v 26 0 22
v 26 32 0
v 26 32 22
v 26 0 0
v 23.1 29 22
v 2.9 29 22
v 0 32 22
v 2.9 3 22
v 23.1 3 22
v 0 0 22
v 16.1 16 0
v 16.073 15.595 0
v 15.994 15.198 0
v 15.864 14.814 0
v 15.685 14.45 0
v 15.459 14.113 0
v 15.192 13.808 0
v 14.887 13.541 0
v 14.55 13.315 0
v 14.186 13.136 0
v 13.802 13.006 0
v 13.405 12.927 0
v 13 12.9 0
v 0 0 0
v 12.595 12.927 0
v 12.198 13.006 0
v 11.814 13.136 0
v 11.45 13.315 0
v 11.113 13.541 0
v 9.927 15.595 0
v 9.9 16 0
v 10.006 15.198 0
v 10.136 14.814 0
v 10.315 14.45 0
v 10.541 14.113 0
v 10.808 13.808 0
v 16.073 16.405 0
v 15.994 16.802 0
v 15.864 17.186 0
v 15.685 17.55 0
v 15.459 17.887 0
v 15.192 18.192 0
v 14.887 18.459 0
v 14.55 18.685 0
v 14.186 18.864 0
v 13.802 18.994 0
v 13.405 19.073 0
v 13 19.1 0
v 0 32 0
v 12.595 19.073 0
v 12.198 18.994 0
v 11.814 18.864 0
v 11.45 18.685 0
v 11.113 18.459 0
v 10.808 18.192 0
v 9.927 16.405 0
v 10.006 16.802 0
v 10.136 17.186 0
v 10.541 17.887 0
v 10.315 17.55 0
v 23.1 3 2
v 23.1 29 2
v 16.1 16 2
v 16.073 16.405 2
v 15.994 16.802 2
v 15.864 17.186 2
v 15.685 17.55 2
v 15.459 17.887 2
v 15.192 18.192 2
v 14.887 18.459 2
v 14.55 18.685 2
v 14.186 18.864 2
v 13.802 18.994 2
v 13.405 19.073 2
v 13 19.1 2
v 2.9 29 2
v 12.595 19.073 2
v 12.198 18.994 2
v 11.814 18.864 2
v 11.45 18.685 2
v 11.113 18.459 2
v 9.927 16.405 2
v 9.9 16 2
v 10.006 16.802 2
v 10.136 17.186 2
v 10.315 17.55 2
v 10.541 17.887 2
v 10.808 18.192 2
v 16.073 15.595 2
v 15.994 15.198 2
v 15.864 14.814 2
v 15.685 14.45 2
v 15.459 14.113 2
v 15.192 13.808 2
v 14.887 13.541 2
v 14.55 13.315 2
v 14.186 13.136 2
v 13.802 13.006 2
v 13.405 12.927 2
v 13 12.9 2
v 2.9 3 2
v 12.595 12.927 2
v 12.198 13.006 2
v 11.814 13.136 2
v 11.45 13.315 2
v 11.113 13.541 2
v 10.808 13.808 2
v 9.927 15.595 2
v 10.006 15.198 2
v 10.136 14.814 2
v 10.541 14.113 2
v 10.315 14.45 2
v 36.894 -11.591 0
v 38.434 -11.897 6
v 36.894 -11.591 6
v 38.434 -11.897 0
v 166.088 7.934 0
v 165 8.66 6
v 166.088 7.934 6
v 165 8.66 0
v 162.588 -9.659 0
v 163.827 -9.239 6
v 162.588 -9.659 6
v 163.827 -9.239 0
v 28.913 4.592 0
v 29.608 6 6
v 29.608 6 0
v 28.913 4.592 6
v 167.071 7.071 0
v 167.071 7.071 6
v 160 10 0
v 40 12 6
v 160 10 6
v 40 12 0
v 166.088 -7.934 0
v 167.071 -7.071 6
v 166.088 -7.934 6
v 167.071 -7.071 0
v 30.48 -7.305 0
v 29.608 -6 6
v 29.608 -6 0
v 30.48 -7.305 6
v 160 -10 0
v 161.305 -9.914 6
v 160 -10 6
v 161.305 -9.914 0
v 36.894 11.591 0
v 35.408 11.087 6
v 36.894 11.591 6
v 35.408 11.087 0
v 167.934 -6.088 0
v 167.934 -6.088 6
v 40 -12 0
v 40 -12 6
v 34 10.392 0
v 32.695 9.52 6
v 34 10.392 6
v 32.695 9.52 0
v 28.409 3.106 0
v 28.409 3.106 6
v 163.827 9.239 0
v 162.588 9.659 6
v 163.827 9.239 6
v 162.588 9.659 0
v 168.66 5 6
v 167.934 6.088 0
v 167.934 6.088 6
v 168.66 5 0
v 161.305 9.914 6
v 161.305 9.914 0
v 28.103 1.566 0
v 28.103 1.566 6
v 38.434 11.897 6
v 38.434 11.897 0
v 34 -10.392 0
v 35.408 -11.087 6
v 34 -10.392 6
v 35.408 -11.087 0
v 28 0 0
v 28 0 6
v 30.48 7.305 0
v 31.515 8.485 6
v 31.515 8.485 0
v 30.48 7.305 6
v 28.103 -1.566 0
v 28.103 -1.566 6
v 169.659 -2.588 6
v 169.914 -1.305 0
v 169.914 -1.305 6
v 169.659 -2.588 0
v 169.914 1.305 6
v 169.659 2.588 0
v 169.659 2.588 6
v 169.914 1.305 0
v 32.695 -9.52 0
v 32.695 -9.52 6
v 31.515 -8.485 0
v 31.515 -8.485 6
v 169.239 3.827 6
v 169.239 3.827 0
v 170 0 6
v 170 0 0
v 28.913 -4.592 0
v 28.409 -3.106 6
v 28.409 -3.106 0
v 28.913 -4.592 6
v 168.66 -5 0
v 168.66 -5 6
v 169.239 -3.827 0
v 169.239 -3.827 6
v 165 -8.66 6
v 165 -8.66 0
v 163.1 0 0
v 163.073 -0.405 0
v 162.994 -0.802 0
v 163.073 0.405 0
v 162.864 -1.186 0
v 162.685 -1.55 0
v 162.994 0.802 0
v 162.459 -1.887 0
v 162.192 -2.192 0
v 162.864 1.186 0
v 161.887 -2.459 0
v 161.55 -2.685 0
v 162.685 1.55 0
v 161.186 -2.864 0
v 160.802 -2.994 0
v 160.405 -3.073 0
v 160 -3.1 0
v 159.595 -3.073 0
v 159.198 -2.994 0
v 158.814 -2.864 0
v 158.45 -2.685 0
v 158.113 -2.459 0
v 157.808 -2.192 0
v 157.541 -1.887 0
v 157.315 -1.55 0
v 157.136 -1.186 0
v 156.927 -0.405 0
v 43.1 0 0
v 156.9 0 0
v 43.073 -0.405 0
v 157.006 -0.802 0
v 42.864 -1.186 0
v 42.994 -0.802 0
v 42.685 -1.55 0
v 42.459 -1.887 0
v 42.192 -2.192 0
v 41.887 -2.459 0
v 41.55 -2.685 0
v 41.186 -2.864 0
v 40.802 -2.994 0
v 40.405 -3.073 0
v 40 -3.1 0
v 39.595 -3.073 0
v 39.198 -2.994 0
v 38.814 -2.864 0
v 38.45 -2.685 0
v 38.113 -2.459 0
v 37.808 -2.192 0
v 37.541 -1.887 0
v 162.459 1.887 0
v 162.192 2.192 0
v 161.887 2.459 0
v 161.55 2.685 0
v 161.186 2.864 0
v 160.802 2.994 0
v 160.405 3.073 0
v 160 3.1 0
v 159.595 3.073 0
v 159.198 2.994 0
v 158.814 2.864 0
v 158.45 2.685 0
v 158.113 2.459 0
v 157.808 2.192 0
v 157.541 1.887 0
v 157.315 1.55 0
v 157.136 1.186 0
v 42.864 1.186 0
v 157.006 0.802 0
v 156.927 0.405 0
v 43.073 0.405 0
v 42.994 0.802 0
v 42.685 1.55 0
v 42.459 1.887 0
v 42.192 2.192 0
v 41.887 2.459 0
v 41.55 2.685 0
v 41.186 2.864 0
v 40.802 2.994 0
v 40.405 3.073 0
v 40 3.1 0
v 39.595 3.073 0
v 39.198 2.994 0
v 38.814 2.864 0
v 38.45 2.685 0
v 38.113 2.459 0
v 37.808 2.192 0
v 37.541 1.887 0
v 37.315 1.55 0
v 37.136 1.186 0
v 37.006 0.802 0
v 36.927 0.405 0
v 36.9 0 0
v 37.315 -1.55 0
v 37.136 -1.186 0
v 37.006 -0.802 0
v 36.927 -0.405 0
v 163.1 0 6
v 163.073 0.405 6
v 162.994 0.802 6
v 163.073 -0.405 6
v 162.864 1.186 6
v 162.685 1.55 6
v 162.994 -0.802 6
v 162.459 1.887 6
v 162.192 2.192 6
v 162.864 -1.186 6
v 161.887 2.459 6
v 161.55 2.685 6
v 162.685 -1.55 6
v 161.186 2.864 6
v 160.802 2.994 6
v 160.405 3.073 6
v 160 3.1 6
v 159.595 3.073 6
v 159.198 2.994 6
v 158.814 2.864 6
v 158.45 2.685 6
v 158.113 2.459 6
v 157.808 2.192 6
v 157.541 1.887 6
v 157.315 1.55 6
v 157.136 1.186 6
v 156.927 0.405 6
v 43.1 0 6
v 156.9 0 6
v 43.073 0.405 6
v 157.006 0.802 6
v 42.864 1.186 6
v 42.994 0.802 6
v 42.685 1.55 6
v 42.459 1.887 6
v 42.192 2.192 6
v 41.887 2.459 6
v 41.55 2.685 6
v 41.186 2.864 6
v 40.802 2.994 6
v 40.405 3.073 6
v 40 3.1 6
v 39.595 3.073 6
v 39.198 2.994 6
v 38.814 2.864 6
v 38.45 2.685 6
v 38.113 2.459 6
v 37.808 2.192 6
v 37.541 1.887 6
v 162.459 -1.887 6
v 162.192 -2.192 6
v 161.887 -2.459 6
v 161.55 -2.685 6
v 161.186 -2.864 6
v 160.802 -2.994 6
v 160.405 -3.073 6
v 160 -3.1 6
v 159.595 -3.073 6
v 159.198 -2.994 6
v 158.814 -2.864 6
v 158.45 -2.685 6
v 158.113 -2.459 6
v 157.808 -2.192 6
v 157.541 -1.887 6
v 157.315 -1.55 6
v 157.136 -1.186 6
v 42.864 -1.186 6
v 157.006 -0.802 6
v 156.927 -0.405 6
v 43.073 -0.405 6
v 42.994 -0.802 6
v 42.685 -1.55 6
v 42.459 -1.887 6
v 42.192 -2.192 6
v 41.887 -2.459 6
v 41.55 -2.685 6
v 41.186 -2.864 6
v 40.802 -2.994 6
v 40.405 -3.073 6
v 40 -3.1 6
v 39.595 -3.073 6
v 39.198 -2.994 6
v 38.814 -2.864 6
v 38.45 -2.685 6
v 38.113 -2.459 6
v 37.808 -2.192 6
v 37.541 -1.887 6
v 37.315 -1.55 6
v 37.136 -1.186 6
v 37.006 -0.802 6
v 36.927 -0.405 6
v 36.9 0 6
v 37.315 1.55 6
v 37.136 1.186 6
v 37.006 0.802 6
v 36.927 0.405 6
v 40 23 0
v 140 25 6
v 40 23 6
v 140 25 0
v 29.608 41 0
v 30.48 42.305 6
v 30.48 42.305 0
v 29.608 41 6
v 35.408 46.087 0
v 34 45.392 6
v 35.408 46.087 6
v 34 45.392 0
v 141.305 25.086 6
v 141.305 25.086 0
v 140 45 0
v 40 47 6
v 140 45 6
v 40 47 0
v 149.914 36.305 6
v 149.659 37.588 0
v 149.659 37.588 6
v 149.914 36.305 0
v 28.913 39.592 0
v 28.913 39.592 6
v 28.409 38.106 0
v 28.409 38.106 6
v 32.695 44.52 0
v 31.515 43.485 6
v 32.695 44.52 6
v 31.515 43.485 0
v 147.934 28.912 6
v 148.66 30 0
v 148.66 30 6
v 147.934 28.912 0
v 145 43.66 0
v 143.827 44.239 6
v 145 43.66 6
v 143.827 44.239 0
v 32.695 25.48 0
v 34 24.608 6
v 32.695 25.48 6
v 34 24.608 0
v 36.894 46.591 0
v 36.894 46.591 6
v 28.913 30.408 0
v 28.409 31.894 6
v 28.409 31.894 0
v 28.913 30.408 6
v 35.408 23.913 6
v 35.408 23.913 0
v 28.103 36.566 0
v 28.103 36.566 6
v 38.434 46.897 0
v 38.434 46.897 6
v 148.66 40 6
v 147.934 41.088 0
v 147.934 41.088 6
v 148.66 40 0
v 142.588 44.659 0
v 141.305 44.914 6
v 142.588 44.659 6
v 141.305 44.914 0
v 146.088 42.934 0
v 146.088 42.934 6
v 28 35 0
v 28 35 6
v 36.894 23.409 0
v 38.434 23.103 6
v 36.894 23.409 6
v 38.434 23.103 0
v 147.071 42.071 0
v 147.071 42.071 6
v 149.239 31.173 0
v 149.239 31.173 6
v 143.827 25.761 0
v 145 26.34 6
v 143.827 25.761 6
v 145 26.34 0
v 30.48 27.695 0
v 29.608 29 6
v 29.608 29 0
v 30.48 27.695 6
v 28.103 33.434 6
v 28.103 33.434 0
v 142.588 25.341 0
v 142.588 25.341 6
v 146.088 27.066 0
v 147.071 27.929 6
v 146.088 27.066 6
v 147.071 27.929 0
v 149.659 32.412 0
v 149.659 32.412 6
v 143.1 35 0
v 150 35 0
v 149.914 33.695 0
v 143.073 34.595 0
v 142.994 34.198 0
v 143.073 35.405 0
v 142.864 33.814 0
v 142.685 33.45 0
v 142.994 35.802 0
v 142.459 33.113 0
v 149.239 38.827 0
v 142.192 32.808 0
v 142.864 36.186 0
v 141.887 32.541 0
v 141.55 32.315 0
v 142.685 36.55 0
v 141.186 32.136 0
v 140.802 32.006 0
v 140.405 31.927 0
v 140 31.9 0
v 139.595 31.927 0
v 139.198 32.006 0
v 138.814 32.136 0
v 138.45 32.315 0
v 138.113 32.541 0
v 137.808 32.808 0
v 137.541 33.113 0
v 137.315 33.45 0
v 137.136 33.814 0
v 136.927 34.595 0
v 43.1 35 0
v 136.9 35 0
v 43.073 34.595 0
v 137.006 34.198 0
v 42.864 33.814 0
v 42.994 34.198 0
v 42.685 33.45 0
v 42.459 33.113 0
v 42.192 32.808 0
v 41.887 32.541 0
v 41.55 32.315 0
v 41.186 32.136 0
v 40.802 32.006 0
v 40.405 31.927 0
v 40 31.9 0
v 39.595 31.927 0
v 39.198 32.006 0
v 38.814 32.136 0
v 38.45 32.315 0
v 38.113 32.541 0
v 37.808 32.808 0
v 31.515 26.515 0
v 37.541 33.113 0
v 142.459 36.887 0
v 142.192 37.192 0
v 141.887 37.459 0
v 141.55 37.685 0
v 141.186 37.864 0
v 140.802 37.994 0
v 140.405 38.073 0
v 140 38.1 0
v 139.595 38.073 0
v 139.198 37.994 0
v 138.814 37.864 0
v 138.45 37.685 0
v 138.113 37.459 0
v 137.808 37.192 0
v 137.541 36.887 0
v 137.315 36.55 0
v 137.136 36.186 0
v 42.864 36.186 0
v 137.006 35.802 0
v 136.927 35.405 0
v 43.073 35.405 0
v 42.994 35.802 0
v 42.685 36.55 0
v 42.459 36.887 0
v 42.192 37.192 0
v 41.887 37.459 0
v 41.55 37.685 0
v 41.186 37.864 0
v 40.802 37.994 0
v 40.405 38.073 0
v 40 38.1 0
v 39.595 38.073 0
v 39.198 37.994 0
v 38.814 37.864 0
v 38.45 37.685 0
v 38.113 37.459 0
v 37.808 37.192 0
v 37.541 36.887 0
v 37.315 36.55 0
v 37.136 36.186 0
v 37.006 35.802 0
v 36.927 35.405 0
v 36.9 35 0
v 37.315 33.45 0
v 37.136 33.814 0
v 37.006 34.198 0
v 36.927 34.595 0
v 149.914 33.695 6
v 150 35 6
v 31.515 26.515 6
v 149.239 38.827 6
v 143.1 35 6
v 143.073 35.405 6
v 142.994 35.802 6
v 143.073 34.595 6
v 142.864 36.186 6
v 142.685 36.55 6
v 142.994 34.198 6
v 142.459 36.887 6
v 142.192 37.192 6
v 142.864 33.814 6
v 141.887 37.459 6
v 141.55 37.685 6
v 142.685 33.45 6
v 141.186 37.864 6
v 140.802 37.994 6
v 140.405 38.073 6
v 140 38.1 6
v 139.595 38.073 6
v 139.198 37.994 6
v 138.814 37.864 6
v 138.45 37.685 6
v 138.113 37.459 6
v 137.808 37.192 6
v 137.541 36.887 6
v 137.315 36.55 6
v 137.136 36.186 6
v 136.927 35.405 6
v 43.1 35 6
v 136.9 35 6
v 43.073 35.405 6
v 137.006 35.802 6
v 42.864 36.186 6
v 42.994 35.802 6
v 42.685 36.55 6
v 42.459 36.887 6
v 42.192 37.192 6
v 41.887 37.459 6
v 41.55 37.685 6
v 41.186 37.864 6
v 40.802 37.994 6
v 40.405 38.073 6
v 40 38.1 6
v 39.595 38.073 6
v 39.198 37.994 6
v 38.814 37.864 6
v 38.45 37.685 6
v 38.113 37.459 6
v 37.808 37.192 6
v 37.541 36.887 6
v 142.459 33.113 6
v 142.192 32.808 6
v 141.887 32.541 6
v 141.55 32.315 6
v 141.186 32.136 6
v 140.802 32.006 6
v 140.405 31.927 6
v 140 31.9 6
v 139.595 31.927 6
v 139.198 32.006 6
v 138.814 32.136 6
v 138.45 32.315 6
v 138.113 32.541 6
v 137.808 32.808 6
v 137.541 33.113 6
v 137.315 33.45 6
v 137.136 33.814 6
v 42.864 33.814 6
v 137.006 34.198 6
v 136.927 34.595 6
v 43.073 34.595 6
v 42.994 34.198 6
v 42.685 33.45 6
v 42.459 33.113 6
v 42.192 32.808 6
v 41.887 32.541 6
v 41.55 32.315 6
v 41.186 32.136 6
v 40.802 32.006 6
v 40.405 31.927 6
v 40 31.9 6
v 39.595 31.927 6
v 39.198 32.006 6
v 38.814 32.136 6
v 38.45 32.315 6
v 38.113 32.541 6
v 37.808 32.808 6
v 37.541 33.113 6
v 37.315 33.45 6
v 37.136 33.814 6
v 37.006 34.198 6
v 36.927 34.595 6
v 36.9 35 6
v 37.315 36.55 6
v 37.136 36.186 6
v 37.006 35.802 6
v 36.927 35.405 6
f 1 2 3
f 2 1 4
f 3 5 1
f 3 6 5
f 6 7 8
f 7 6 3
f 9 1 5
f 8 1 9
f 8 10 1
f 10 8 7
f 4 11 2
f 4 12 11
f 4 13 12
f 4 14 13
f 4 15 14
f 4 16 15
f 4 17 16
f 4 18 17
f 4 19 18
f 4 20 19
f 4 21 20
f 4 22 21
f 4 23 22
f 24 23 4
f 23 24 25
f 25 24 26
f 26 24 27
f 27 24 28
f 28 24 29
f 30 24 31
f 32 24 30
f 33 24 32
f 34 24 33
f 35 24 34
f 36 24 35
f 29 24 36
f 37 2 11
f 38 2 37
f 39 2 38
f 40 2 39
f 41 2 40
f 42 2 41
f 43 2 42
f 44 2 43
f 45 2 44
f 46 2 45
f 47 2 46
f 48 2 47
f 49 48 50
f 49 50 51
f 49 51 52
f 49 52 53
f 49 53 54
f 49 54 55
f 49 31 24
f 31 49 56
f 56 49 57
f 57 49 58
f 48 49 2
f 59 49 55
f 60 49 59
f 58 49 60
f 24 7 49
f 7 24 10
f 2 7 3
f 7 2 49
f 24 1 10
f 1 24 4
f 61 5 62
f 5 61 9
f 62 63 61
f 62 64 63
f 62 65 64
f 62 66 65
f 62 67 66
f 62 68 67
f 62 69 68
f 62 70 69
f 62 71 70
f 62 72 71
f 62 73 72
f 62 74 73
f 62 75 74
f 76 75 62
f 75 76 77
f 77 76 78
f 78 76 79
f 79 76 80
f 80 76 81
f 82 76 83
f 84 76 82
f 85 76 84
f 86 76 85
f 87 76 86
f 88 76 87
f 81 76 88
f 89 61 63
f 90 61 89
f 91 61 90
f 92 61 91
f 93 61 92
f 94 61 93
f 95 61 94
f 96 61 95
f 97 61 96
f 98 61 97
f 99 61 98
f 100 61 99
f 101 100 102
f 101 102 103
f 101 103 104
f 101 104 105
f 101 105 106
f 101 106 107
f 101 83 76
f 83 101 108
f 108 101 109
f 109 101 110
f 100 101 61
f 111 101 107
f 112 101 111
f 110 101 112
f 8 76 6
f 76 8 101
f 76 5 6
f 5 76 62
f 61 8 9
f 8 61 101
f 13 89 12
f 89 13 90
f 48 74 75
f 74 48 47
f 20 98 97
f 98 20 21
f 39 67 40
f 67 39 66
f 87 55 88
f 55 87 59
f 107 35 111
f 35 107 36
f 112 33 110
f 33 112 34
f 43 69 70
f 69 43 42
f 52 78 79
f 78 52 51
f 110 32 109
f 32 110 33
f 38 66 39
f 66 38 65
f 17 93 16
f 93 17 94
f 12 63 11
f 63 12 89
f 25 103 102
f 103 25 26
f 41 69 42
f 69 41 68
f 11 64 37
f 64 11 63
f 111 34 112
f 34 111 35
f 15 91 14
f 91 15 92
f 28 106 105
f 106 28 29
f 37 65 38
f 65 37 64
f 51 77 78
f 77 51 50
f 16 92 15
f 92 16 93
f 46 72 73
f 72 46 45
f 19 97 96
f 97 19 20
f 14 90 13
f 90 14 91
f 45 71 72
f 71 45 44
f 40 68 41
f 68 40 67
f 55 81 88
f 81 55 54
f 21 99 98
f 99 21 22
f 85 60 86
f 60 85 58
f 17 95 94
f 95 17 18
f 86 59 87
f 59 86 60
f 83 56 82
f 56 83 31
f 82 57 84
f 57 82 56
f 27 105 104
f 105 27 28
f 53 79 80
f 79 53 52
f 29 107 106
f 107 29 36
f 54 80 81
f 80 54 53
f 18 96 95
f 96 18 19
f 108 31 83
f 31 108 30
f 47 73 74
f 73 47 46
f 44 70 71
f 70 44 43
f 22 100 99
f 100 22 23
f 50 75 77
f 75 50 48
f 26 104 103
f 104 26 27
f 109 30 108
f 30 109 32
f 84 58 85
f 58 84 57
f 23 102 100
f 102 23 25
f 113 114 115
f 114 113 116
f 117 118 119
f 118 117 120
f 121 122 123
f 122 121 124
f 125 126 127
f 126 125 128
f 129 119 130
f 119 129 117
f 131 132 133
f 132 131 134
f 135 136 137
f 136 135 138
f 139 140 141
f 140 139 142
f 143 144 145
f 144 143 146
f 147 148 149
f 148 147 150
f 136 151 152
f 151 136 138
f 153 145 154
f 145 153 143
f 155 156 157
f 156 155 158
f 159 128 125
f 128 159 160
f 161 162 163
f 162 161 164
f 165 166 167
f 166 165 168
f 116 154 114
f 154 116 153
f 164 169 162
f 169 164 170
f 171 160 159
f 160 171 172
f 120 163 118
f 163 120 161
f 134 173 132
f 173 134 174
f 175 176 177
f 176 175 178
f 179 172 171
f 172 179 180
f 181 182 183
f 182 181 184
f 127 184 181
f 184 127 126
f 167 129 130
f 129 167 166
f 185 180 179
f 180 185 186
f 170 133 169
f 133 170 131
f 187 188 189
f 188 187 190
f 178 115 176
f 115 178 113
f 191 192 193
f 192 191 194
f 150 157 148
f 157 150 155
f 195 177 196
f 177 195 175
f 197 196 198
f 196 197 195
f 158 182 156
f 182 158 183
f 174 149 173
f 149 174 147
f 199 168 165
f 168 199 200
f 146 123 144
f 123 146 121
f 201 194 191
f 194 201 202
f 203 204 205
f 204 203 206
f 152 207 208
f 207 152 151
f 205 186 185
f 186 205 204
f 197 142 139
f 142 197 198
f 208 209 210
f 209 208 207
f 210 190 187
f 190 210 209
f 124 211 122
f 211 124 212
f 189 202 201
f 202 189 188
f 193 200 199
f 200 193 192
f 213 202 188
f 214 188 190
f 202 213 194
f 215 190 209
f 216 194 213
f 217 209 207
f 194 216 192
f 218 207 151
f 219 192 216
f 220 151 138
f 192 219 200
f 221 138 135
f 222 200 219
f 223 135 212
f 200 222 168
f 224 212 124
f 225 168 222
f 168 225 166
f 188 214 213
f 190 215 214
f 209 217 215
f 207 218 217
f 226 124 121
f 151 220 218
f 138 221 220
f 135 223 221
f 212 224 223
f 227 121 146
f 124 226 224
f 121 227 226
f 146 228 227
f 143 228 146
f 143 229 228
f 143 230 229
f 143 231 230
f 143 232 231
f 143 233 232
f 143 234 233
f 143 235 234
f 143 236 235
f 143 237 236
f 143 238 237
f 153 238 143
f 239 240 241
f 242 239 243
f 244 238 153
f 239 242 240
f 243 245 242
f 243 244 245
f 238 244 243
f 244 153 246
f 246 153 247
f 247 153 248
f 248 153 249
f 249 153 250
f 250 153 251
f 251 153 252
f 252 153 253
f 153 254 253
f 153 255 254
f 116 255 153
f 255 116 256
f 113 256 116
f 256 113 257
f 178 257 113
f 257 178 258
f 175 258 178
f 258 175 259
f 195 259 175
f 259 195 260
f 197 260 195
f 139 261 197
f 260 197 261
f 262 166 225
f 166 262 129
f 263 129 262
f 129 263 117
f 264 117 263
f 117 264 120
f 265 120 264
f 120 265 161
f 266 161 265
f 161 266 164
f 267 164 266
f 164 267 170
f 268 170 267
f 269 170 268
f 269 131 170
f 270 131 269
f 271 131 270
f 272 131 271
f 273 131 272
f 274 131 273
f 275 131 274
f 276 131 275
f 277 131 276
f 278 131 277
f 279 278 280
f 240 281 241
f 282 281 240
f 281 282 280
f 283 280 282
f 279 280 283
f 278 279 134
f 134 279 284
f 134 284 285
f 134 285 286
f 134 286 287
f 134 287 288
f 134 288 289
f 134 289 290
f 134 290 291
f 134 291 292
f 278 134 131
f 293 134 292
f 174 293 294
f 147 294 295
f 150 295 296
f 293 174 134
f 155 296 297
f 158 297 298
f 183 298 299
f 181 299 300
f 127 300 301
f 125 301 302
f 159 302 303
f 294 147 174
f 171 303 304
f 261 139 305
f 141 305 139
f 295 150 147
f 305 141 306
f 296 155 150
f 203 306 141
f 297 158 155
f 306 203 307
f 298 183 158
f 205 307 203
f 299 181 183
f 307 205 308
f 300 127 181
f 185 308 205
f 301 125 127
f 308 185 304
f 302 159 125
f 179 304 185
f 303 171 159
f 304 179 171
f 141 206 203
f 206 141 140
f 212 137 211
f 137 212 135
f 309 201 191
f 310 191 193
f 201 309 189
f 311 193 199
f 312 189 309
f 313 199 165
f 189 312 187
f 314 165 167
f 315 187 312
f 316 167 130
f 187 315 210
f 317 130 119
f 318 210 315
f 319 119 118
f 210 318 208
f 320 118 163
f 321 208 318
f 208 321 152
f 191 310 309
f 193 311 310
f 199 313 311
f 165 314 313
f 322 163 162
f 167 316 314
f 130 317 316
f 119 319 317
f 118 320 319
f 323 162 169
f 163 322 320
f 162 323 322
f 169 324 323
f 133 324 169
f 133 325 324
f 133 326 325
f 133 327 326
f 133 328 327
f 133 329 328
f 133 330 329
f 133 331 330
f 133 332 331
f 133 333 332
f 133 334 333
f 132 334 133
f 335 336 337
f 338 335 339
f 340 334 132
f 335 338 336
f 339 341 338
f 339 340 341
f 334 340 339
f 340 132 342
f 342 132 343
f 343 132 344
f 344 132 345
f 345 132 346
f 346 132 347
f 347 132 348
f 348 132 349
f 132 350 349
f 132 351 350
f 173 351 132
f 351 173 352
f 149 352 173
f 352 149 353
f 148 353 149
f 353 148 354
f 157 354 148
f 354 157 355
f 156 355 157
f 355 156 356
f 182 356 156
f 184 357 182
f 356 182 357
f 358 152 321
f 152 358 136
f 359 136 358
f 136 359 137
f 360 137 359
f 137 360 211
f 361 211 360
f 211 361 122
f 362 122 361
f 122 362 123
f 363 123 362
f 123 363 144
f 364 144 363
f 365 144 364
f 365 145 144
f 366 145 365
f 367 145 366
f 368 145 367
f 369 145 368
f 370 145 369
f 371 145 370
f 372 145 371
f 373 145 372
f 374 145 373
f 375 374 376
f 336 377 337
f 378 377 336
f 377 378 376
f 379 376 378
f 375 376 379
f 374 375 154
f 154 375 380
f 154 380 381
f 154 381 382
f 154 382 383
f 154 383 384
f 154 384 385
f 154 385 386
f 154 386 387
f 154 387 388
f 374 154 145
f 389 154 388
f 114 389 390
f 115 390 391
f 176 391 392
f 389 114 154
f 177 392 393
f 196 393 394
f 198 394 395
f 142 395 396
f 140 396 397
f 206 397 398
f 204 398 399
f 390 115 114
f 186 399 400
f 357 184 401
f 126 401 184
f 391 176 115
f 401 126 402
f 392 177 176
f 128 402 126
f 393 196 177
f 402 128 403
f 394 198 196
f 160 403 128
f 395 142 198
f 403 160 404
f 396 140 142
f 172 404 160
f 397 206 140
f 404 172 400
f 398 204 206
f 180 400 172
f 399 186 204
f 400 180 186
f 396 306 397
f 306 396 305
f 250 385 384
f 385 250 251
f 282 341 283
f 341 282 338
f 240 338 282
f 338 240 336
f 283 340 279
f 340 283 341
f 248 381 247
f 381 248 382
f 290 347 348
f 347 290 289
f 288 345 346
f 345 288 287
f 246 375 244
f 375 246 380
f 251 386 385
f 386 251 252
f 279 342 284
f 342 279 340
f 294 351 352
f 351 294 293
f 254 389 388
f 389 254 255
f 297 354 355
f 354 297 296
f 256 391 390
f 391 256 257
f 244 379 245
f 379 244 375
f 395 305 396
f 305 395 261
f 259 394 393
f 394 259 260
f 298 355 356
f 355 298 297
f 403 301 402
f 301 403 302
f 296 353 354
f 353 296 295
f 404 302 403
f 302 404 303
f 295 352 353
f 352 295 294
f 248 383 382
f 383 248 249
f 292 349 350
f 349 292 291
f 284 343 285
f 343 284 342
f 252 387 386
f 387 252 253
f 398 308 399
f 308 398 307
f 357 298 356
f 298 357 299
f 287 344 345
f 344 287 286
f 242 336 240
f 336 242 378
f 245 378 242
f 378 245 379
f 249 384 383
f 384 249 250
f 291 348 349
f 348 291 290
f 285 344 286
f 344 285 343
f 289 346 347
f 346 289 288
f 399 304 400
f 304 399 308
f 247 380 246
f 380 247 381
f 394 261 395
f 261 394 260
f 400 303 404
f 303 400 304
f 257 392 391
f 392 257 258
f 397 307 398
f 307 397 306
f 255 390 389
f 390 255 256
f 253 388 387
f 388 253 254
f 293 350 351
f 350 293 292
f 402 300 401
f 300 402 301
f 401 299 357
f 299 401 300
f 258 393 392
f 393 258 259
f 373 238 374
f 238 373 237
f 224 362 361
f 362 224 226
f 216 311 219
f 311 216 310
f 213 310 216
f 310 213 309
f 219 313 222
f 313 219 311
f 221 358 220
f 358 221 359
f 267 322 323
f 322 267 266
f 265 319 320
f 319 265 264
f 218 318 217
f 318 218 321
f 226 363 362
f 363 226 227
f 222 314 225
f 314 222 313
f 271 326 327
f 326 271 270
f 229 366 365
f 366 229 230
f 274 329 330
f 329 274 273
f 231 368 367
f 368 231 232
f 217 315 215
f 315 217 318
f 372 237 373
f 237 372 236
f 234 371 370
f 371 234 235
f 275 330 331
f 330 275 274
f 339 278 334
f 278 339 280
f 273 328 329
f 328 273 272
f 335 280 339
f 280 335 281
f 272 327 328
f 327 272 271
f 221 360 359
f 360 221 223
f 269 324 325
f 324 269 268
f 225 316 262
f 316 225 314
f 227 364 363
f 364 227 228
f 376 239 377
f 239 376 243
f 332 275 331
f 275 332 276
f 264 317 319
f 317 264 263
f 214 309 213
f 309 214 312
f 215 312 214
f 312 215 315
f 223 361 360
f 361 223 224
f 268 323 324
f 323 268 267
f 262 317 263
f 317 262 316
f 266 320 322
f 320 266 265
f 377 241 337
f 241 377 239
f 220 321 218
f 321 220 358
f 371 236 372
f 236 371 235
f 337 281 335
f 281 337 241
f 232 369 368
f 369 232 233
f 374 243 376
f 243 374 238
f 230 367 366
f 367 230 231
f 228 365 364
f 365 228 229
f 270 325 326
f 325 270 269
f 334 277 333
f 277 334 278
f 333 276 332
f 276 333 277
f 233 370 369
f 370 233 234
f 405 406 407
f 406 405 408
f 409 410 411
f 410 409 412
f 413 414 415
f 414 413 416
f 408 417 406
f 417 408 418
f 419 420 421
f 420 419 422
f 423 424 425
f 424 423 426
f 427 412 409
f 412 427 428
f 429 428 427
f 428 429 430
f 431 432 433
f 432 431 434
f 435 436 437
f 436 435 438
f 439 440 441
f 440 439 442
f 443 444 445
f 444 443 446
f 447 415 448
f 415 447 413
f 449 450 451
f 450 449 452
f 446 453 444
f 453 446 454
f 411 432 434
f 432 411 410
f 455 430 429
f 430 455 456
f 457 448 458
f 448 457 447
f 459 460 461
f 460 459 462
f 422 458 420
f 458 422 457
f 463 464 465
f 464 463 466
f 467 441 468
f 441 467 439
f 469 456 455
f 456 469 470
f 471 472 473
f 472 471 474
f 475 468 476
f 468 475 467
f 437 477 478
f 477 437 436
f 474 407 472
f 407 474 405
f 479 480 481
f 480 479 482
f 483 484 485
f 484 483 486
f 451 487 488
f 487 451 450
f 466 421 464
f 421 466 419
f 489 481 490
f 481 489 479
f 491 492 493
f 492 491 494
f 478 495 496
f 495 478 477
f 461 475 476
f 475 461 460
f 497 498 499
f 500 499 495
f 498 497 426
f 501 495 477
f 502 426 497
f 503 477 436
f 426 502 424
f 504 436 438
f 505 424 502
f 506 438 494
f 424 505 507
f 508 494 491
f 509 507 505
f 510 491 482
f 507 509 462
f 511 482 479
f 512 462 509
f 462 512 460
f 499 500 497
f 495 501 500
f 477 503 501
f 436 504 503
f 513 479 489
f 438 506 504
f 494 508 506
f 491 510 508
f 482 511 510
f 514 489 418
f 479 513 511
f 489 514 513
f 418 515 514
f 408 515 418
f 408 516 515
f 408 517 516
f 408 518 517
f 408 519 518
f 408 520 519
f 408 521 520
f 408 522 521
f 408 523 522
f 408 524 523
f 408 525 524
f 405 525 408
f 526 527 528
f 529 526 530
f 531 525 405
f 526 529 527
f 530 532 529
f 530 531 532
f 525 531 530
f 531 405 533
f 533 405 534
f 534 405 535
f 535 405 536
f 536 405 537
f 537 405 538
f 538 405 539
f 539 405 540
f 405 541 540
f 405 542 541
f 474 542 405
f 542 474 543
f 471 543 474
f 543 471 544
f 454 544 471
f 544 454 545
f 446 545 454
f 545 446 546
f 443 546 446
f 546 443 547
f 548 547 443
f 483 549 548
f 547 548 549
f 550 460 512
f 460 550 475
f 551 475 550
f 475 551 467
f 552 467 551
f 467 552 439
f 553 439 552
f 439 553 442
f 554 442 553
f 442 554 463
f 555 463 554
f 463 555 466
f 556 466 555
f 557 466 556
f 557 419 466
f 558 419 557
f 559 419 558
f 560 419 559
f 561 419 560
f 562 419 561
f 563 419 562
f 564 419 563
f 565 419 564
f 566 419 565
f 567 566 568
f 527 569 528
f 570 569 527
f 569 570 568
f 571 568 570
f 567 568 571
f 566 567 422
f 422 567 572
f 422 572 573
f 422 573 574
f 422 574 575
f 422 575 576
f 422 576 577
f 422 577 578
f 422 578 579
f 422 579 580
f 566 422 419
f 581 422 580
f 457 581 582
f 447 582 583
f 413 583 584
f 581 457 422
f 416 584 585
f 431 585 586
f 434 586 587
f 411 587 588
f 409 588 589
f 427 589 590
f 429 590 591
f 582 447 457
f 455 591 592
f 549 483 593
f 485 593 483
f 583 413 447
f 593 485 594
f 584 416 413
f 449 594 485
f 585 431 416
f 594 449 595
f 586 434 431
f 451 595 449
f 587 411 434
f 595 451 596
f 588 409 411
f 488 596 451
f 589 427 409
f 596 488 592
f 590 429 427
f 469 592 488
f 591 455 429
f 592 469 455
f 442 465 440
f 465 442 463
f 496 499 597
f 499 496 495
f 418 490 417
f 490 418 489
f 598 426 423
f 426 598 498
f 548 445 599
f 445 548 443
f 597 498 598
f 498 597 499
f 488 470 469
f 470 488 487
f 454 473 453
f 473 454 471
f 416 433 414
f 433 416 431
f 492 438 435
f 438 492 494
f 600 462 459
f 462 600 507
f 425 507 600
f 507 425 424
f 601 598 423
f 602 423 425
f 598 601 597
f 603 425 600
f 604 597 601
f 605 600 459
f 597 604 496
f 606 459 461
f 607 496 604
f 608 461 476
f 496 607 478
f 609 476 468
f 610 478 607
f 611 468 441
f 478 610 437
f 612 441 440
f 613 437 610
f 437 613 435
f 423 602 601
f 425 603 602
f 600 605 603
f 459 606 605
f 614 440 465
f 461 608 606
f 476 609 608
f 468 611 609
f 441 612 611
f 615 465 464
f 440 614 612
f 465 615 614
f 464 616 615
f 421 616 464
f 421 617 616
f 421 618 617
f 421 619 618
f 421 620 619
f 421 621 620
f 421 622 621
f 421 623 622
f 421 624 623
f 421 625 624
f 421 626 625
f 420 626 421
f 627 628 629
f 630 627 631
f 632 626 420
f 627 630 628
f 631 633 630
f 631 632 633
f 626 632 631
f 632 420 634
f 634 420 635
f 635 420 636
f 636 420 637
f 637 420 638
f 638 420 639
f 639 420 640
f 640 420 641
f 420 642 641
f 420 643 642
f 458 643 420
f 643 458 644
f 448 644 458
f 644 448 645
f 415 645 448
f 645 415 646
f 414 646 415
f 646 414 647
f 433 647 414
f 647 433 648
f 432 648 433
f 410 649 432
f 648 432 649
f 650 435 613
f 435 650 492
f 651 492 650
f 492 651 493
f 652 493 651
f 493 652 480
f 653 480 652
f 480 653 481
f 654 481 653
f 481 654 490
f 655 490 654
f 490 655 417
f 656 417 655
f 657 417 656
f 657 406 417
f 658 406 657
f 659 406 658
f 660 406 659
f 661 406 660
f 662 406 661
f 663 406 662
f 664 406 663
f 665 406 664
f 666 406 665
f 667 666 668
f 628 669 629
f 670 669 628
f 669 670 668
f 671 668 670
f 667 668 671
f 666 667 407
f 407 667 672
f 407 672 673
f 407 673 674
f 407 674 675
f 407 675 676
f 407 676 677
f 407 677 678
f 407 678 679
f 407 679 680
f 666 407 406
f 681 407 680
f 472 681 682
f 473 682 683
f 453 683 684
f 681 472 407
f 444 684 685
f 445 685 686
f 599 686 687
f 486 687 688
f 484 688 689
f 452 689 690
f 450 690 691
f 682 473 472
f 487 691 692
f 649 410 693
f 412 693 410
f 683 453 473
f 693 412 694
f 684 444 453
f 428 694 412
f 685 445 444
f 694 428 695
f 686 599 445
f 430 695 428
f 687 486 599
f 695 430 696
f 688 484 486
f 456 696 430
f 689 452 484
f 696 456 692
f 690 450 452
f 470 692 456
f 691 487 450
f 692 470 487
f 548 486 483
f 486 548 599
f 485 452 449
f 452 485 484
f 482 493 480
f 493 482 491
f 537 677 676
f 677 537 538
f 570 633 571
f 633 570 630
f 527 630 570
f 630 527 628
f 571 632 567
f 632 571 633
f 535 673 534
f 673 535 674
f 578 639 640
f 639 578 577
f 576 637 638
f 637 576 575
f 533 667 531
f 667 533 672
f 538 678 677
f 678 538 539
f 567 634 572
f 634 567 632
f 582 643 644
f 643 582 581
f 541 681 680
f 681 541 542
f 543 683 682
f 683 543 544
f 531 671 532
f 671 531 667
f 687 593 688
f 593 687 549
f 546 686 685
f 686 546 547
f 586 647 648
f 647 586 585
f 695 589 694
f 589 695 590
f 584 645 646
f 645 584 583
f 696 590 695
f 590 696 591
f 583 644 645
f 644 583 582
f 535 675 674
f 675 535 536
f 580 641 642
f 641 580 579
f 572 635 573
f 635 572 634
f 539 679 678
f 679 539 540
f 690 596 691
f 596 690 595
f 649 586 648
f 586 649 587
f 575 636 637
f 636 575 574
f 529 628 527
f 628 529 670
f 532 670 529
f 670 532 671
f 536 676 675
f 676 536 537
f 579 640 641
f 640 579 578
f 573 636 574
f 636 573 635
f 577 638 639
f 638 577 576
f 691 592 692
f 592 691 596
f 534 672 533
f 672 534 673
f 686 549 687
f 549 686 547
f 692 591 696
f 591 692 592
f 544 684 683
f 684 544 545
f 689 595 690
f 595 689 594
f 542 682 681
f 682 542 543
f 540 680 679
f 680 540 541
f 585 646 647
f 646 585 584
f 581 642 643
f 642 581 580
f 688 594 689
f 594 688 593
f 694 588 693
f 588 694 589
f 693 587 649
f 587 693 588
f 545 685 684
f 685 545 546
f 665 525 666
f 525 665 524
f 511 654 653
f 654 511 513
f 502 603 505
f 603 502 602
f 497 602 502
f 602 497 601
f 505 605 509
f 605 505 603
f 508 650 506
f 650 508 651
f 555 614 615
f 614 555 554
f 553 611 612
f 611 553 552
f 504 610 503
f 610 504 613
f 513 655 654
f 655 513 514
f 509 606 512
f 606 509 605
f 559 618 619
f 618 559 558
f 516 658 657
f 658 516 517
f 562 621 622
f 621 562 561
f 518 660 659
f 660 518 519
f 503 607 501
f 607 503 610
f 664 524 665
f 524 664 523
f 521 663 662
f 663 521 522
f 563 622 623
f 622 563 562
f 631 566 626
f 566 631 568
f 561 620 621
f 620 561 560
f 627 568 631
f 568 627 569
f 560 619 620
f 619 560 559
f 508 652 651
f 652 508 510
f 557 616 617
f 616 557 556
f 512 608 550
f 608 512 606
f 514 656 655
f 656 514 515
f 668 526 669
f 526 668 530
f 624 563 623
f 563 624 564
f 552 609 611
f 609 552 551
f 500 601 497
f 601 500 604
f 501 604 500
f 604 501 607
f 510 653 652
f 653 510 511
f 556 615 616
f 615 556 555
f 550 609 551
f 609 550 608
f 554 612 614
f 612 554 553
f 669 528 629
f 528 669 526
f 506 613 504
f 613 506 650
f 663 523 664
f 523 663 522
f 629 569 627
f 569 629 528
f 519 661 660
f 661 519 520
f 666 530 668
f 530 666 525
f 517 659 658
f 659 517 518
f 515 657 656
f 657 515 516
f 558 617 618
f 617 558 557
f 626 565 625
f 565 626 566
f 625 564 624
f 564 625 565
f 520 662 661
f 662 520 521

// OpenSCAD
// cad/mounts_opcionais/tray_mount_2dof.scad — Braco Planar 2-DOF (L1=120mm, L2=100mm SO-ARM100)
$fn = 48;

l1 = 120.0;
l2 = 100.0;

module servo_pocket() {
    difference() {
        cube([26, 32, 22]);
        translate([2.9, 3.0, 2]) cube([20.2, 26.0, 21]);
        translate([13, 16, -1]) cylinder(r = 3.1, h = 5);
    }
}

module link_arm(len_mm) {
    difference() {
        hull() {
            cylinder(r = 12, h = 6);
            translate([len_mm, 0, 0]) cylinder(r = 10, h = 6);
        }
        translate([0, 0, -1]) cylinder(r = 3.1, h = 8);
        translate([len_mm, 0, -1]) cylinder(r = 3.1, h = 8);
    }
}

servo_pocket();
translate([40, 0, 0]) link_arm(l1);
translate([40, 35, 0]) link_arm(l2);
